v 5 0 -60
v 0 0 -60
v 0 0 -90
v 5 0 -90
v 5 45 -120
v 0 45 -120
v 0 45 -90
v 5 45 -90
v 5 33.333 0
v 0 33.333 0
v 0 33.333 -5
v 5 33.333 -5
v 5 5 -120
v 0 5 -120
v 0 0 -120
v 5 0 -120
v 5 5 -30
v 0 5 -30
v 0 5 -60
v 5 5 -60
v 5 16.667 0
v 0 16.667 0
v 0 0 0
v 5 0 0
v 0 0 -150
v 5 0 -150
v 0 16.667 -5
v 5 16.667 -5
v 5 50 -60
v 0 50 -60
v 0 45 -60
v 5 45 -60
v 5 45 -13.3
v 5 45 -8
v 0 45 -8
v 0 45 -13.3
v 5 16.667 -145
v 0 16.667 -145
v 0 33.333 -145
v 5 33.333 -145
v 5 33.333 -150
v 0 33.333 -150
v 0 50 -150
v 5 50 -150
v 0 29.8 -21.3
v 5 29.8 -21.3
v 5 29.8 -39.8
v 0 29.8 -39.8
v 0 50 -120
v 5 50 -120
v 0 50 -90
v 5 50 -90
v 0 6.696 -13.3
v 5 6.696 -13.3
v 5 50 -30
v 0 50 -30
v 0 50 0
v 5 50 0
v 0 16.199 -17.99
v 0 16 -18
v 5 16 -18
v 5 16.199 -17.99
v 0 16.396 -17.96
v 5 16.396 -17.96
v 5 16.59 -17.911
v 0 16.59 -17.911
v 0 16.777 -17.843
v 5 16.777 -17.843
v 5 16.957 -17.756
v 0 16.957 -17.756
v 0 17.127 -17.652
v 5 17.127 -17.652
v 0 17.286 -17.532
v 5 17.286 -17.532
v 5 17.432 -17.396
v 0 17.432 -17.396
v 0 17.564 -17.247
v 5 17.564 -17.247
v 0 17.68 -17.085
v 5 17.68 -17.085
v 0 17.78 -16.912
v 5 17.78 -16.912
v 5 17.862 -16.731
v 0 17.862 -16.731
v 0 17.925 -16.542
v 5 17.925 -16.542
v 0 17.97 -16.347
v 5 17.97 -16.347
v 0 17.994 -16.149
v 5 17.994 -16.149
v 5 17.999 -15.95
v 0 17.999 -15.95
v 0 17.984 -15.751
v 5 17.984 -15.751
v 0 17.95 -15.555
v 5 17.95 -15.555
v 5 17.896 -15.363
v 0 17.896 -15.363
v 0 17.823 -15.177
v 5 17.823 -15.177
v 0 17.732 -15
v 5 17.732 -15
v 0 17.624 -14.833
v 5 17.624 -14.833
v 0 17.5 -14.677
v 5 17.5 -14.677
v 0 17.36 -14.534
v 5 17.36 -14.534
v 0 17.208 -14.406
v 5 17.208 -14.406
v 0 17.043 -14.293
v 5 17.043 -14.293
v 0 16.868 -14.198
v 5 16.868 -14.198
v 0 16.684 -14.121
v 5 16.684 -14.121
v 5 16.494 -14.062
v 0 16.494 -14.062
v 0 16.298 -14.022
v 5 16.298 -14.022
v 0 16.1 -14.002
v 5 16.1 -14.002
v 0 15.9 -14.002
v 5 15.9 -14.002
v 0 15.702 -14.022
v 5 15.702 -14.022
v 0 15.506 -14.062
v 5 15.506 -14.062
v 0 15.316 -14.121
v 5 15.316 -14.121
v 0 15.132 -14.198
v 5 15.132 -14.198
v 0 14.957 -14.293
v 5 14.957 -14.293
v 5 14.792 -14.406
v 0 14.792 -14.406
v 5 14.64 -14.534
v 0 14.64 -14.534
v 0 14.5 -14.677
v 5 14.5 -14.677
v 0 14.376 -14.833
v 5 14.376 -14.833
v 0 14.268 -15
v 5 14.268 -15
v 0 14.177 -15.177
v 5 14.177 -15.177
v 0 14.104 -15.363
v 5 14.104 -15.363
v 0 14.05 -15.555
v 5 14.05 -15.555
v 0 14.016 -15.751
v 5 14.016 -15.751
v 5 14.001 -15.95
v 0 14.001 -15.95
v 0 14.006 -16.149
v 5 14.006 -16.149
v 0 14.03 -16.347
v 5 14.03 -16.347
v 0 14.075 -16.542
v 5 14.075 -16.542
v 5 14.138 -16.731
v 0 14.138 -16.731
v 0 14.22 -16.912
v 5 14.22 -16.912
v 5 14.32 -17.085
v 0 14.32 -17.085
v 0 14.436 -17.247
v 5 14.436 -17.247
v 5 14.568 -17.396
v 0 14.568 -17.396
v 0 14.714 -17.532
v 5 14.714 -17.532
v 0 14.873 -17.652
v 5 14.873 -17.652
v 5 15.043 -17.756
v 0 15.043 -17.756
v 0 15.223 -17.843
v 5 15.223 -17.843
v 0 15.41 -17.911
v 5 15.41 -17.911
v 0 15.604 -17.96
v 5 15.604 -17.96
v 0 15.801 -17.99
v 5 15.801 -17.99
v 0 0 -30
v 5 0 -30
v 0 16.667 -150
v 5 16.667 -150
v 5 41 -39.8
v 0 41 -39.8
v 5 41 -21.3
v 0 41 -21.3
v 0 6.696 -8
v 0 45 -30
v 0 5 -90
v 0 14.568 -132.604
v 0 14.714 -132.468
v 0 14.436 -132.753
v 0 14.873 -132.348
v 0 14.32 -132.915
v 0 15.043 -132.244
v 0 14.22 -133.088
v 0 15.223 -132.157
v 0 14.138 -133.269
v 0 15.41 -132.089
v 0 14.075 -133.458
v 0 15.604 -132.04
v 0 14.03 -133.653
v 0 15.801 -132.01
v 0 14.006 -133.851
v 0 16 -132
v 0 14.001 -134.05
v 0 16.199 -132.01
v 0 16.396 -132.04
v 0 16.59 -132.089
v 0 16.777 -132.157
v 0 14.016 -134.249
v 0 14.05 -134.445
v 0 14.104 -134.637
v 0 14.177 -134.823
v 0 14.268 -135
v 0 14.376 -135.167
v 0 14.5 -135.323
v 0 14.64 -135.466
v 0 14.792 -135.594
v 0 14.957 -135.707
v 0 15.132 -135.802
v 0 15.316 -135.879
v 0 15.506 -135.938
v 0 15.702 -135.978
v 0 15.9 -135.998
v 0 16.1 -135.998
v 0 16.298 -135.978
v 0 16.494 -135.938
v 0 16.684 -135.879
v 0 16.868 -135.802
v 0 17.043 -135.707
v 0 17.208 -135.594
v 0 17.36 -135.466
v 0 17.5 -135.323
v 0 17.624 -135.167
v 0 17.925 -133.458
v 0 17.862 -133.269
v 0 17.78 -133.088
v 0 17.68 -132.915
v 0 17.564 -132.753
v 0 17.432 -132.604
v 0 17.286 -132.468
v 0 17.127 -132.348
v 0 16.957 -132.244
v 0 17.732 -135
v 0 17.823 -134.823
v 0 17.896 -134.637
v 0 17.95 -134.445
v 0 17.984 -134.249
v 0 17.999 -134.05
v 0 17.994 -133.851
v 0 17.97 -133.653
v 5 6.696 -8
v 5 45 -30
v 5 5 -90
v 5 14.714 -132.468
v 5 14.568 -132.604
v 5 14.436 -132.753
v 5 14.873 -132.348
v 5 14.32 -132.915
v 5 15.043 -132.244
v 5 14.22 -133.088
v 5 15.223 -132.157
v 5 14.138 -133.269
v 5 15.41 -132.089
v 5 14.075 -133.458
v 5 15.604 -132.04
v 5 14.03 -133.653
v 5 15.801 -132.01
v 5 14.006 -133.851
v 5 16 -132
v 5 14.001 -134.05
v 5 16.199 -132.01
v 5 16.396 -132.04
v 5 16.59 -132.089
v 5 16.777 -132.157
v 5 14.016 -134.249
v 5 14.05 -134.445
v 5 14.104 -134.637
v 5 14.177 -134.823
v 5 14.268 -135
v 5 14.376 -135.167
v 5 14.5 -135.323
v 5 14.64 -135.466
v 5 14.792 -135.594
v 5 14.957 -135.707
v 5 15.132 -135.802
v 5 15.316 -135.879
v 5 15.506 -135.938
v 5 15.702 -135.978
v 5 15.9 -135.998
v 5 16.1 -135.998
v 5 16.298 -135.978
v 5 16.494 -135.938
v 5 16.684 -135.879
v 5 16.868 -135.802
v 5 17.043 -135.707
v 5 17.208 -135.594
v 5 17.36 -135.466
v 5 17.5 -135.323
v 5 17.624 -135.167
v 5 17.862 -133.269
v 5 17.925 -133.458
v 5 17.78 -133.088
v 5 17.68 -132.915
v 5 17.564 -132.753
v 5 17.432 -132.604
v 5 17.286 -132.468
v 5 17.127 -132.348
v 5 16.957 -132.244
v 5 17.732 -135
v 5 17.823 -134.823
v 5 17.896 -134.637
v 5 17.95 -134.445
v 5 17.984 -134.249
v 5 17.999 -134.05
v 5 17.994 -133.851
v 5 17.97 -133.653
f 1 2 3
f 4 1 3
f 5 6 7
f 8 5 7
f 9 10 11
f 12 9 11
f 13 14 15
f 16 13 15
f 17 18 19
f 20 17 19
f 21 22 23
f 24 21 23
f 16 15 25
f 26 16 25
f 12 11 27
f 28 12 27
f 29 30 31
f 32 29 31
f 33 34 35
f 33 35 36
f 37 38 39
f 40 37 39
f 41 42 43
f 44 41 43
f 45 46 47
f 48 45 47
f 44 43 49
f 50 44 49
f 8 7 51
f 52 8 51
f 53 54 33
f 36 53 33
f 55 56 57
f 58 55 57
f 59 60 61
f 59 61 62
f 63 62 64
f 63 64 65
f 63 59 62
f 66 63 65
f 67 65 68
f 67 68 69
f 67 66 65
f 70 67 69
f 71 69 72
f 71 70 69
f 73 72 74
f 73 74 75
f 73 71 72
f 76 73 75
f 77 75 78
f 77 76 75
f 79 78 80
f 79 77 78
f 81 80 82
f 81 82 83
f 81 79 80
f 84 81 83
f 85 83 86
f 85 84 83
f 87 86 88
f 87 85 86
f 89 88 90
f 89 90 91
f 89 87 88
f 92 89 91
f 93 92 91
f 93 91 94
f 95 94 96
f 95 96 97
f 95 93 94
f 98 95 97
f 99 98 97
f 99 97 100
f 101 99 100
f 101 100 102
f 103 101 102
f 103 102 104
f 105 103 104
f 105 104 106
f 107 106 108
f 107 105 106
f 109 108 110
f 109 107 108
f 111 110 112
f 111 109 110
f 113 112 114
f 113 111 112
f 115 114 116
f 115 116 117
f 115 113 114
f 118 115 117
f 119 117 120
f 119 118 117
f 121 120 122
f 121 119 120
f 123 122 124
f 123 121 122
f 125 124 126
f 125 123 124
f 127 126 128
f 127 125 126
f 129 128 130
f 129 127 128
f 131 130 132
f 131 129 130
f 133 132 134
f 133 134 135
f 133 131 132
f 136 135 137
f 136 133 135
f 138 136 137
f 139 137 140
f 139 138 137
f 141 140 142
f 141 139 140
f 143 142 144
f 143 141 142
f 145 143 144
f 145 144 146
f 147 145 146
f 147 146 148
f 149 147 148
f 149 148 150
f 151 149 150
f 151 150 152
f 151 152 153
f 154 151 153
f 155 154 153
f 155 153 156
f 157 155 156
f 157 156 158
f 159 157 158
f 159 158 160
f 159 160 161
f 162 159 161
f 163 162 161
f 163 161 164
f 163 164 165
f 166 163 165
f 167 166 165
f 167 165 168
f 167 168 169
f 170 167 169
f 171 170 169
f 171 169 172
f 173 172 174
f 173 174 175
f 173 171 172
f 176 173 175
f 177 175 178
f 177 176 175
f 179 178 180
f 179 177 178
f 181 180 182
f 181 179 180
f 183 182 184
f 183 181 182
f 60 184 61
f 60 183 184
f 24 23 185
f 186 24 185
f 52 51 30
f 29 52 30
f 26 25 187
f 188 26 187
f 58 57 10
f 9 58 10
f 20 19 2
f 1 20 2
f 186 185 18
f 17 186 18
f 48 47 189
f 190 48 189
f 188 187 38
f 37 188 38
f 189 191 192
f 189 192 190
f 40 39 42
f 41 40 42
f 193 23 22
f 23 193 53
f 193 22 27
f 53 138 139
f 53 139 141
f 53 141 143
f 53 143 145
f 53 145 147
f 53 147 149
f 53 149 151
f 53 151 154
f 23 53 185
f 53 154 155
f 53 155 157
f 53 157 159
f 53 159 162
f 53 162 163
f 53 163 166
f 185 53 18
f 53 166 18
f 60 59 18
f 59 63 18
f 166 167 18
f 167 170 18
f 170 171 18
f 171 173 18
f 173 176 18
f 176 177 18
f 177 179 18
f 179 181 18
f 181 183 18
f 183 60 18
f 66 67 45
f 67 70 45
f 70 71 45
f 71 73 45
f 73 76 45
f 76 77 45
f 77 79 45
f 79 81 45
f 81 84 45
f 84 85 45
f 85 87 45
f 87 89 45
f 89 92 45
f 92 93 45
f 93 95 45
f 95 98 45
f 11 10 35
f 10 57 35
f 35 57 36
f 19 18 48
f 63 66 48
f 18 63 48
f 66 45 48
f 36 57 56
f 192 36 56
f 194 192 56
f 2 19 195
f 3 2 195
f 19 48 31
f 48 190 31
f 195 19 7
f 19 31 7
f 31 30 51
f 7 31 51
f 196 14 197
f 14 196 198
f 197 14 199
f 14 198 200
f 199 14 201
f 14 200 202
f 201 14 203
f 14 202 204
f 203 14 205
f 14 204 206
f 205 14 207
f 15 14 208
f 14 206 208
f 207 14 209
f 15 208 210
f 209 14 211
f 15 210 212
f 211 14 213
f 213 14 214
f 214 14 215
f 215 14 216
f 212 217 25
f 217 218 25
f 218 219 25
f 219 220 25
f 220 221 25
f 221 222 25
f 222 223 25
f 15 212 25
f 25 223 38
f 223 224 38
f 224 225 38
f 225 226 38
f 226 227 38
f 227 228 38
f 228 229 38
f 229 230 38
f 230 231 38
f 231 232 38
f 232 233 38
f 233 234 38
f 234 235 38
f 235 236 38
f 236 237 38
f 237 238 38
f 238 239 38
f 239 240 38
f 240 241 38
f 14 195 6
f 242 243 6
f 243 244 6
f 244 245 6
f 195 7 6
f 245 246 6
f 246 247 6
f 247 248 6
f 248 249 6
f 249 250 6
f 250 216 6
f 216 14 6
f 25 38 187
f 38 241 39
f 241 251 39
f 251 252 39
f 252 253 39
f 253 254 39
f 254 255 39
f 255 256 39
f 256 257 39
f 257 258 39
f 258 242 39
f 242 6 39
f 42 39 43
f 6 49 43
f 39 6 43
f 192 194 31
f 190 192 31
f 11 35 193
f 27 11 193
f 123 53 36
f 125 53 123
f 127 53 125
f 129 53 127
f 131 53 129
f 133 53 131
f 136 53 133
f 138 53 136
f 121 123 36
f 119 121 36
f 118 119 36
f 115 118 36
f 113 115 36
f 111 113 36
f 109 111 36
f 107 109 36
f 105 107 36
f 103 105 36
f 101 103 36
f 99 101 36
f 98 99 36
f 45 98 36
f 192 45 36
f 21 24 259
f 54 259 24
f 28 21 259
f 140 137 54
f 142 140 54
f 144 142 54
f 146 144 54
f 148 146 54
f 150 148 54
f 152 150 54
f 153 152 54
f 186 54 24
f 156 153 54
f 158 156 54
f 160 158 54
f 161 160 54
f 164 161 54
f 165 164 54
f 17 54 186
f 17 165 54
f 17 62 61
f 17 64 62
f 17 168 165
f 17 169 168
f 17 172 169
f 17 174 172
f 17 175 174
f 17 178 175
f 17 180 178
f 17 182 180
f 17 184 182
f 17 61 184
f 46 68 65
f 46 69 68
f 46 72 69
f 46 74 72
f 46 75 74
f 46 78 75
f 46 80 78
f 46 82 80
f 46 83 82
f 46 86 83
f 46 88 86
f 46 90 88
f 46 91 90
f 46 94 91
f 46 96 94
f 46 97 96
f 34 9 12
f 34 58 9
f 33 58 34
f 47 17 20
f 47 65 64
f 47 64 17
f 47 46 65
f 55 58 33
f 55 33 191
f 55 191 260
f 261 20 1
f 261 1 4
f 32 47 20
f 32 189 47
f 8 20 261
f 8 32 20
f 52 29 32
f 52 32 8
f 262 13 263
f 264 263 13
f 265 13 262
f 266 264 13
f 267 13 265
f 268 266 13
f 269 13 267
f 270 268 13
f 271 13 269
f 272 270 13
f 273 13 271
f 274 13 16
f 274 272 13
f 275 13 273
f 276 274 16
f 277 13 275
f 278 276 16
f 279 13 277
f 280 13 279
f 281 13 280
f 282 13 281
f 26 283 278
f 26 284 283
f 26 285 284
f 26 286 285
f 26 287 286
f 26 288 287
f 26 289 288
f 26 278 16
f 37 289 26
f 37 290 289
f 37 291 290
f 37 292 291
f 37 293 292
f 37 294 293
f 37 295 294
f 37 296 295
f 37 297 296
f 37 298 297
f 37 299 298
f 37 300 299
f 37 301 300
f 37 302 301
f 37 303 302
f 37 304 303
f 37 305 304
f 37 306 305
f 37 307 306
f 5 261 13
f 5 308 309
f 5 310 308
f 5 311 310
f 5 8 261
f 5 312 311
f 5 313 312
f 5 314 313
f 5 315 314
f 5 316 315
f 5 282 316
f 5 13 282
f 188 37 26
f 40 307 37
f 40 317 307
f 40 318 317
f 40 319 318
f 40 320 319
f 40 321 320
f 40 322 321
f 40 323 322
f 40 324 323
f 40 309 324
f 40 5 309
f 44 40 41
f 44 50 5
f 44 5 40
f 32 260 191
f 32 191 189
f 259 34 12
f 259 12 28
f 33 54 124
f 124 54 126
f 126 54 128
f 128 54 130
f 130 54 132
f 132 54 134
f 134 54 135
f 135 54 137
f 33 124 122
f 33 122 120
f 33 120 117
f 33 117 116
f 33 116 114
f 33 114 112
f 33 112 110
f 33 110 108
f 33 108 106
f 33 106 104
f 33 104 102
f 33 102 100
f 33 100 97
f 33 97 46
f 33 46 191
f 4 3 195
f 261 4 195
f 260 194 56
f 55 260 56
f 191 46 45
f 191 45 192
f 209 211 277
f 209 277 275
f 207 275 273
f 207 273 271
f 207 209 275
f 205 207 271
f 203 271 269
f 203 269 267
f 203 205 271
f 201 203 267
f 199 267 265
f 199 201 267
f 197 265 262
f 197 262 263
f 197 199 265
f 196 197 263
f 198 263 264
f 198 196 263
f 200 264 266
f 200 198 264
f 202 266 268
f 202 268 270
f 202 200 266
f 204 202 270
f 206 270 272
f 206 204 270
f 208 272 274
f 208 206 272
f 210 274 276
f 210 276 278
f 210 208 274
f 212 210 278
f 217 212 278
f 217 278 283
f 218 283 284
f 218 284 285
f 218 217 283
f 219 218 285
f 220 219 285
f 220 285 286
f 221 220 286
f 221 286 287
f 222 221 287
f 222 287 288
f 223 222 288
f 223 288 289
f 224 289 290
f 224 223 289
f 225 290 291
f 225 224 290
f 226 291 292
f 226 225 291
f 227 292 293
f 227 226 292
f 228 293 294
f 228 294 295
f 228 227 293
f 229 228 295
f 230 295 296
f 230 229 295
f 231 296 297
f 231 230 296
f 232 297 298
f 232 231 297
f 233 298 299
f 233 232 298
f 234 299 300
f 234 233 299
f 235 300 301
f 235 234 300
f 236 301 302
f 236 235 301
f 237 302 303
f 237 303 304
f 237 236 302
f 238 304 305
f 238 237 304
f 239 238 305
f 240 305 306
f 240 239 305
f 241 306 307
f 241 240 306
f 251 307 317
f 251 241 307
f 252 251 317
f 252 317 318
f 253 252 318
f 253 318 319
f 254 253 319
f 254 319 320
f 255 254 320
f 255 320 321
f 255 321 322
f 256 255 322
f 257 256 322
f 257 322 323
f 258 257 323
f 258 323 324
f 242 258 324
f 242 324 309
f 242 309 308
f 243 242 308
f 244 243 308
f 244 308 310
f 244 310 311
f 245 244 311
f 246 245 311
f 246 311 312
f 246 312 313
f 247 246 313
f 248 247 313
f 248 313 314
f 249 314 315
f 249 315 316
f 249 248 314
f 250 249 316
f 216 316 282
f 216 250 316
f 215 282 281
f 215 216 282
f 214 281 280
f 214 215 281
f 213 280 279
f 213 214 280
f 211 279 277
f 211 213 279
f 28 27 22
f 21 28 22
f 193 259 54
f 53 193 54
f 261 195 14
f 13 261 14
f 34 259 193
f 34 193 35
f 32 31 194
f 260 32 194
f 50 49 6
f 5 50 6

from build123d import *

# Parameters (mm, degrees)
CROQUIS1_R              = 2
SALIENTE_EXTRUIR1_DEPTH = 5
CROQUIS2_W              = 5.3
CROQUIS2_H              = 38.303523839
CROQUIS2_W_2            = 18.5
CROQUIS2_H_2            = 11.2
CORTAR_EXTRUIR1_DEPTH   = 10


with BuildPart() as part:
    # Croquis1 → Saliente-Extruir1 (new body)
    with BuildSketch(Plane(origin=(0, 0, 0), x_dir=(0, 0, -1), z_dir=(1, 0, 0))):
        Polygon((0, 33.333333333), (5, 33.333333333), (5, 16.666666667), (0, 16.666666667), (0, 0), (30, 0), (30, 5), (60, 5), (60, 0), (90, 0), (90, 5), (120, 5), (120, 0), (150, 0), (150, 16.666666667), (145, 16.666666667), (145, 33.333333333), (150, 33.333333333), (150, 50), (120, 50), (120, 45), (90, 45), (90, 50), (60, 50), (60, 45), (30, 45), (30, 50), (0, 50), align=None)
        with Locations((16, 16)):
            Circle(CROQUIS1_R, mode=Mode.SUBTRACT)
        with Locations(Location((134, 16, 0), (0, 0, 180))):
            Circle(CROQUIS1_R, mode=Mode.SUBTRACT)
    extrude(amount=SALIENTE_EXTRUIR1_DEPTH)

    # Croquis2 → Cortar-Extruir1 (cut)
    with BuildSketch(Plane(origin=(5, 0, 0), x_dir=(0, 0, -1), z_dir=(1, 0, 0))):
        with Locations((10.65, 25.84823808)):
            Rectangle(CROQUIS2_W, CROQUIS2_H)
        with Locations((30.55, 35.4)):
            Rectangle(CROQUIS2_W_2, CROQUIS2_H_2)
    extrude(amount=-CORTAR_EXTRUIR1_DEPTH, mode=Mode.SUBTRACT)


solid = part.part
